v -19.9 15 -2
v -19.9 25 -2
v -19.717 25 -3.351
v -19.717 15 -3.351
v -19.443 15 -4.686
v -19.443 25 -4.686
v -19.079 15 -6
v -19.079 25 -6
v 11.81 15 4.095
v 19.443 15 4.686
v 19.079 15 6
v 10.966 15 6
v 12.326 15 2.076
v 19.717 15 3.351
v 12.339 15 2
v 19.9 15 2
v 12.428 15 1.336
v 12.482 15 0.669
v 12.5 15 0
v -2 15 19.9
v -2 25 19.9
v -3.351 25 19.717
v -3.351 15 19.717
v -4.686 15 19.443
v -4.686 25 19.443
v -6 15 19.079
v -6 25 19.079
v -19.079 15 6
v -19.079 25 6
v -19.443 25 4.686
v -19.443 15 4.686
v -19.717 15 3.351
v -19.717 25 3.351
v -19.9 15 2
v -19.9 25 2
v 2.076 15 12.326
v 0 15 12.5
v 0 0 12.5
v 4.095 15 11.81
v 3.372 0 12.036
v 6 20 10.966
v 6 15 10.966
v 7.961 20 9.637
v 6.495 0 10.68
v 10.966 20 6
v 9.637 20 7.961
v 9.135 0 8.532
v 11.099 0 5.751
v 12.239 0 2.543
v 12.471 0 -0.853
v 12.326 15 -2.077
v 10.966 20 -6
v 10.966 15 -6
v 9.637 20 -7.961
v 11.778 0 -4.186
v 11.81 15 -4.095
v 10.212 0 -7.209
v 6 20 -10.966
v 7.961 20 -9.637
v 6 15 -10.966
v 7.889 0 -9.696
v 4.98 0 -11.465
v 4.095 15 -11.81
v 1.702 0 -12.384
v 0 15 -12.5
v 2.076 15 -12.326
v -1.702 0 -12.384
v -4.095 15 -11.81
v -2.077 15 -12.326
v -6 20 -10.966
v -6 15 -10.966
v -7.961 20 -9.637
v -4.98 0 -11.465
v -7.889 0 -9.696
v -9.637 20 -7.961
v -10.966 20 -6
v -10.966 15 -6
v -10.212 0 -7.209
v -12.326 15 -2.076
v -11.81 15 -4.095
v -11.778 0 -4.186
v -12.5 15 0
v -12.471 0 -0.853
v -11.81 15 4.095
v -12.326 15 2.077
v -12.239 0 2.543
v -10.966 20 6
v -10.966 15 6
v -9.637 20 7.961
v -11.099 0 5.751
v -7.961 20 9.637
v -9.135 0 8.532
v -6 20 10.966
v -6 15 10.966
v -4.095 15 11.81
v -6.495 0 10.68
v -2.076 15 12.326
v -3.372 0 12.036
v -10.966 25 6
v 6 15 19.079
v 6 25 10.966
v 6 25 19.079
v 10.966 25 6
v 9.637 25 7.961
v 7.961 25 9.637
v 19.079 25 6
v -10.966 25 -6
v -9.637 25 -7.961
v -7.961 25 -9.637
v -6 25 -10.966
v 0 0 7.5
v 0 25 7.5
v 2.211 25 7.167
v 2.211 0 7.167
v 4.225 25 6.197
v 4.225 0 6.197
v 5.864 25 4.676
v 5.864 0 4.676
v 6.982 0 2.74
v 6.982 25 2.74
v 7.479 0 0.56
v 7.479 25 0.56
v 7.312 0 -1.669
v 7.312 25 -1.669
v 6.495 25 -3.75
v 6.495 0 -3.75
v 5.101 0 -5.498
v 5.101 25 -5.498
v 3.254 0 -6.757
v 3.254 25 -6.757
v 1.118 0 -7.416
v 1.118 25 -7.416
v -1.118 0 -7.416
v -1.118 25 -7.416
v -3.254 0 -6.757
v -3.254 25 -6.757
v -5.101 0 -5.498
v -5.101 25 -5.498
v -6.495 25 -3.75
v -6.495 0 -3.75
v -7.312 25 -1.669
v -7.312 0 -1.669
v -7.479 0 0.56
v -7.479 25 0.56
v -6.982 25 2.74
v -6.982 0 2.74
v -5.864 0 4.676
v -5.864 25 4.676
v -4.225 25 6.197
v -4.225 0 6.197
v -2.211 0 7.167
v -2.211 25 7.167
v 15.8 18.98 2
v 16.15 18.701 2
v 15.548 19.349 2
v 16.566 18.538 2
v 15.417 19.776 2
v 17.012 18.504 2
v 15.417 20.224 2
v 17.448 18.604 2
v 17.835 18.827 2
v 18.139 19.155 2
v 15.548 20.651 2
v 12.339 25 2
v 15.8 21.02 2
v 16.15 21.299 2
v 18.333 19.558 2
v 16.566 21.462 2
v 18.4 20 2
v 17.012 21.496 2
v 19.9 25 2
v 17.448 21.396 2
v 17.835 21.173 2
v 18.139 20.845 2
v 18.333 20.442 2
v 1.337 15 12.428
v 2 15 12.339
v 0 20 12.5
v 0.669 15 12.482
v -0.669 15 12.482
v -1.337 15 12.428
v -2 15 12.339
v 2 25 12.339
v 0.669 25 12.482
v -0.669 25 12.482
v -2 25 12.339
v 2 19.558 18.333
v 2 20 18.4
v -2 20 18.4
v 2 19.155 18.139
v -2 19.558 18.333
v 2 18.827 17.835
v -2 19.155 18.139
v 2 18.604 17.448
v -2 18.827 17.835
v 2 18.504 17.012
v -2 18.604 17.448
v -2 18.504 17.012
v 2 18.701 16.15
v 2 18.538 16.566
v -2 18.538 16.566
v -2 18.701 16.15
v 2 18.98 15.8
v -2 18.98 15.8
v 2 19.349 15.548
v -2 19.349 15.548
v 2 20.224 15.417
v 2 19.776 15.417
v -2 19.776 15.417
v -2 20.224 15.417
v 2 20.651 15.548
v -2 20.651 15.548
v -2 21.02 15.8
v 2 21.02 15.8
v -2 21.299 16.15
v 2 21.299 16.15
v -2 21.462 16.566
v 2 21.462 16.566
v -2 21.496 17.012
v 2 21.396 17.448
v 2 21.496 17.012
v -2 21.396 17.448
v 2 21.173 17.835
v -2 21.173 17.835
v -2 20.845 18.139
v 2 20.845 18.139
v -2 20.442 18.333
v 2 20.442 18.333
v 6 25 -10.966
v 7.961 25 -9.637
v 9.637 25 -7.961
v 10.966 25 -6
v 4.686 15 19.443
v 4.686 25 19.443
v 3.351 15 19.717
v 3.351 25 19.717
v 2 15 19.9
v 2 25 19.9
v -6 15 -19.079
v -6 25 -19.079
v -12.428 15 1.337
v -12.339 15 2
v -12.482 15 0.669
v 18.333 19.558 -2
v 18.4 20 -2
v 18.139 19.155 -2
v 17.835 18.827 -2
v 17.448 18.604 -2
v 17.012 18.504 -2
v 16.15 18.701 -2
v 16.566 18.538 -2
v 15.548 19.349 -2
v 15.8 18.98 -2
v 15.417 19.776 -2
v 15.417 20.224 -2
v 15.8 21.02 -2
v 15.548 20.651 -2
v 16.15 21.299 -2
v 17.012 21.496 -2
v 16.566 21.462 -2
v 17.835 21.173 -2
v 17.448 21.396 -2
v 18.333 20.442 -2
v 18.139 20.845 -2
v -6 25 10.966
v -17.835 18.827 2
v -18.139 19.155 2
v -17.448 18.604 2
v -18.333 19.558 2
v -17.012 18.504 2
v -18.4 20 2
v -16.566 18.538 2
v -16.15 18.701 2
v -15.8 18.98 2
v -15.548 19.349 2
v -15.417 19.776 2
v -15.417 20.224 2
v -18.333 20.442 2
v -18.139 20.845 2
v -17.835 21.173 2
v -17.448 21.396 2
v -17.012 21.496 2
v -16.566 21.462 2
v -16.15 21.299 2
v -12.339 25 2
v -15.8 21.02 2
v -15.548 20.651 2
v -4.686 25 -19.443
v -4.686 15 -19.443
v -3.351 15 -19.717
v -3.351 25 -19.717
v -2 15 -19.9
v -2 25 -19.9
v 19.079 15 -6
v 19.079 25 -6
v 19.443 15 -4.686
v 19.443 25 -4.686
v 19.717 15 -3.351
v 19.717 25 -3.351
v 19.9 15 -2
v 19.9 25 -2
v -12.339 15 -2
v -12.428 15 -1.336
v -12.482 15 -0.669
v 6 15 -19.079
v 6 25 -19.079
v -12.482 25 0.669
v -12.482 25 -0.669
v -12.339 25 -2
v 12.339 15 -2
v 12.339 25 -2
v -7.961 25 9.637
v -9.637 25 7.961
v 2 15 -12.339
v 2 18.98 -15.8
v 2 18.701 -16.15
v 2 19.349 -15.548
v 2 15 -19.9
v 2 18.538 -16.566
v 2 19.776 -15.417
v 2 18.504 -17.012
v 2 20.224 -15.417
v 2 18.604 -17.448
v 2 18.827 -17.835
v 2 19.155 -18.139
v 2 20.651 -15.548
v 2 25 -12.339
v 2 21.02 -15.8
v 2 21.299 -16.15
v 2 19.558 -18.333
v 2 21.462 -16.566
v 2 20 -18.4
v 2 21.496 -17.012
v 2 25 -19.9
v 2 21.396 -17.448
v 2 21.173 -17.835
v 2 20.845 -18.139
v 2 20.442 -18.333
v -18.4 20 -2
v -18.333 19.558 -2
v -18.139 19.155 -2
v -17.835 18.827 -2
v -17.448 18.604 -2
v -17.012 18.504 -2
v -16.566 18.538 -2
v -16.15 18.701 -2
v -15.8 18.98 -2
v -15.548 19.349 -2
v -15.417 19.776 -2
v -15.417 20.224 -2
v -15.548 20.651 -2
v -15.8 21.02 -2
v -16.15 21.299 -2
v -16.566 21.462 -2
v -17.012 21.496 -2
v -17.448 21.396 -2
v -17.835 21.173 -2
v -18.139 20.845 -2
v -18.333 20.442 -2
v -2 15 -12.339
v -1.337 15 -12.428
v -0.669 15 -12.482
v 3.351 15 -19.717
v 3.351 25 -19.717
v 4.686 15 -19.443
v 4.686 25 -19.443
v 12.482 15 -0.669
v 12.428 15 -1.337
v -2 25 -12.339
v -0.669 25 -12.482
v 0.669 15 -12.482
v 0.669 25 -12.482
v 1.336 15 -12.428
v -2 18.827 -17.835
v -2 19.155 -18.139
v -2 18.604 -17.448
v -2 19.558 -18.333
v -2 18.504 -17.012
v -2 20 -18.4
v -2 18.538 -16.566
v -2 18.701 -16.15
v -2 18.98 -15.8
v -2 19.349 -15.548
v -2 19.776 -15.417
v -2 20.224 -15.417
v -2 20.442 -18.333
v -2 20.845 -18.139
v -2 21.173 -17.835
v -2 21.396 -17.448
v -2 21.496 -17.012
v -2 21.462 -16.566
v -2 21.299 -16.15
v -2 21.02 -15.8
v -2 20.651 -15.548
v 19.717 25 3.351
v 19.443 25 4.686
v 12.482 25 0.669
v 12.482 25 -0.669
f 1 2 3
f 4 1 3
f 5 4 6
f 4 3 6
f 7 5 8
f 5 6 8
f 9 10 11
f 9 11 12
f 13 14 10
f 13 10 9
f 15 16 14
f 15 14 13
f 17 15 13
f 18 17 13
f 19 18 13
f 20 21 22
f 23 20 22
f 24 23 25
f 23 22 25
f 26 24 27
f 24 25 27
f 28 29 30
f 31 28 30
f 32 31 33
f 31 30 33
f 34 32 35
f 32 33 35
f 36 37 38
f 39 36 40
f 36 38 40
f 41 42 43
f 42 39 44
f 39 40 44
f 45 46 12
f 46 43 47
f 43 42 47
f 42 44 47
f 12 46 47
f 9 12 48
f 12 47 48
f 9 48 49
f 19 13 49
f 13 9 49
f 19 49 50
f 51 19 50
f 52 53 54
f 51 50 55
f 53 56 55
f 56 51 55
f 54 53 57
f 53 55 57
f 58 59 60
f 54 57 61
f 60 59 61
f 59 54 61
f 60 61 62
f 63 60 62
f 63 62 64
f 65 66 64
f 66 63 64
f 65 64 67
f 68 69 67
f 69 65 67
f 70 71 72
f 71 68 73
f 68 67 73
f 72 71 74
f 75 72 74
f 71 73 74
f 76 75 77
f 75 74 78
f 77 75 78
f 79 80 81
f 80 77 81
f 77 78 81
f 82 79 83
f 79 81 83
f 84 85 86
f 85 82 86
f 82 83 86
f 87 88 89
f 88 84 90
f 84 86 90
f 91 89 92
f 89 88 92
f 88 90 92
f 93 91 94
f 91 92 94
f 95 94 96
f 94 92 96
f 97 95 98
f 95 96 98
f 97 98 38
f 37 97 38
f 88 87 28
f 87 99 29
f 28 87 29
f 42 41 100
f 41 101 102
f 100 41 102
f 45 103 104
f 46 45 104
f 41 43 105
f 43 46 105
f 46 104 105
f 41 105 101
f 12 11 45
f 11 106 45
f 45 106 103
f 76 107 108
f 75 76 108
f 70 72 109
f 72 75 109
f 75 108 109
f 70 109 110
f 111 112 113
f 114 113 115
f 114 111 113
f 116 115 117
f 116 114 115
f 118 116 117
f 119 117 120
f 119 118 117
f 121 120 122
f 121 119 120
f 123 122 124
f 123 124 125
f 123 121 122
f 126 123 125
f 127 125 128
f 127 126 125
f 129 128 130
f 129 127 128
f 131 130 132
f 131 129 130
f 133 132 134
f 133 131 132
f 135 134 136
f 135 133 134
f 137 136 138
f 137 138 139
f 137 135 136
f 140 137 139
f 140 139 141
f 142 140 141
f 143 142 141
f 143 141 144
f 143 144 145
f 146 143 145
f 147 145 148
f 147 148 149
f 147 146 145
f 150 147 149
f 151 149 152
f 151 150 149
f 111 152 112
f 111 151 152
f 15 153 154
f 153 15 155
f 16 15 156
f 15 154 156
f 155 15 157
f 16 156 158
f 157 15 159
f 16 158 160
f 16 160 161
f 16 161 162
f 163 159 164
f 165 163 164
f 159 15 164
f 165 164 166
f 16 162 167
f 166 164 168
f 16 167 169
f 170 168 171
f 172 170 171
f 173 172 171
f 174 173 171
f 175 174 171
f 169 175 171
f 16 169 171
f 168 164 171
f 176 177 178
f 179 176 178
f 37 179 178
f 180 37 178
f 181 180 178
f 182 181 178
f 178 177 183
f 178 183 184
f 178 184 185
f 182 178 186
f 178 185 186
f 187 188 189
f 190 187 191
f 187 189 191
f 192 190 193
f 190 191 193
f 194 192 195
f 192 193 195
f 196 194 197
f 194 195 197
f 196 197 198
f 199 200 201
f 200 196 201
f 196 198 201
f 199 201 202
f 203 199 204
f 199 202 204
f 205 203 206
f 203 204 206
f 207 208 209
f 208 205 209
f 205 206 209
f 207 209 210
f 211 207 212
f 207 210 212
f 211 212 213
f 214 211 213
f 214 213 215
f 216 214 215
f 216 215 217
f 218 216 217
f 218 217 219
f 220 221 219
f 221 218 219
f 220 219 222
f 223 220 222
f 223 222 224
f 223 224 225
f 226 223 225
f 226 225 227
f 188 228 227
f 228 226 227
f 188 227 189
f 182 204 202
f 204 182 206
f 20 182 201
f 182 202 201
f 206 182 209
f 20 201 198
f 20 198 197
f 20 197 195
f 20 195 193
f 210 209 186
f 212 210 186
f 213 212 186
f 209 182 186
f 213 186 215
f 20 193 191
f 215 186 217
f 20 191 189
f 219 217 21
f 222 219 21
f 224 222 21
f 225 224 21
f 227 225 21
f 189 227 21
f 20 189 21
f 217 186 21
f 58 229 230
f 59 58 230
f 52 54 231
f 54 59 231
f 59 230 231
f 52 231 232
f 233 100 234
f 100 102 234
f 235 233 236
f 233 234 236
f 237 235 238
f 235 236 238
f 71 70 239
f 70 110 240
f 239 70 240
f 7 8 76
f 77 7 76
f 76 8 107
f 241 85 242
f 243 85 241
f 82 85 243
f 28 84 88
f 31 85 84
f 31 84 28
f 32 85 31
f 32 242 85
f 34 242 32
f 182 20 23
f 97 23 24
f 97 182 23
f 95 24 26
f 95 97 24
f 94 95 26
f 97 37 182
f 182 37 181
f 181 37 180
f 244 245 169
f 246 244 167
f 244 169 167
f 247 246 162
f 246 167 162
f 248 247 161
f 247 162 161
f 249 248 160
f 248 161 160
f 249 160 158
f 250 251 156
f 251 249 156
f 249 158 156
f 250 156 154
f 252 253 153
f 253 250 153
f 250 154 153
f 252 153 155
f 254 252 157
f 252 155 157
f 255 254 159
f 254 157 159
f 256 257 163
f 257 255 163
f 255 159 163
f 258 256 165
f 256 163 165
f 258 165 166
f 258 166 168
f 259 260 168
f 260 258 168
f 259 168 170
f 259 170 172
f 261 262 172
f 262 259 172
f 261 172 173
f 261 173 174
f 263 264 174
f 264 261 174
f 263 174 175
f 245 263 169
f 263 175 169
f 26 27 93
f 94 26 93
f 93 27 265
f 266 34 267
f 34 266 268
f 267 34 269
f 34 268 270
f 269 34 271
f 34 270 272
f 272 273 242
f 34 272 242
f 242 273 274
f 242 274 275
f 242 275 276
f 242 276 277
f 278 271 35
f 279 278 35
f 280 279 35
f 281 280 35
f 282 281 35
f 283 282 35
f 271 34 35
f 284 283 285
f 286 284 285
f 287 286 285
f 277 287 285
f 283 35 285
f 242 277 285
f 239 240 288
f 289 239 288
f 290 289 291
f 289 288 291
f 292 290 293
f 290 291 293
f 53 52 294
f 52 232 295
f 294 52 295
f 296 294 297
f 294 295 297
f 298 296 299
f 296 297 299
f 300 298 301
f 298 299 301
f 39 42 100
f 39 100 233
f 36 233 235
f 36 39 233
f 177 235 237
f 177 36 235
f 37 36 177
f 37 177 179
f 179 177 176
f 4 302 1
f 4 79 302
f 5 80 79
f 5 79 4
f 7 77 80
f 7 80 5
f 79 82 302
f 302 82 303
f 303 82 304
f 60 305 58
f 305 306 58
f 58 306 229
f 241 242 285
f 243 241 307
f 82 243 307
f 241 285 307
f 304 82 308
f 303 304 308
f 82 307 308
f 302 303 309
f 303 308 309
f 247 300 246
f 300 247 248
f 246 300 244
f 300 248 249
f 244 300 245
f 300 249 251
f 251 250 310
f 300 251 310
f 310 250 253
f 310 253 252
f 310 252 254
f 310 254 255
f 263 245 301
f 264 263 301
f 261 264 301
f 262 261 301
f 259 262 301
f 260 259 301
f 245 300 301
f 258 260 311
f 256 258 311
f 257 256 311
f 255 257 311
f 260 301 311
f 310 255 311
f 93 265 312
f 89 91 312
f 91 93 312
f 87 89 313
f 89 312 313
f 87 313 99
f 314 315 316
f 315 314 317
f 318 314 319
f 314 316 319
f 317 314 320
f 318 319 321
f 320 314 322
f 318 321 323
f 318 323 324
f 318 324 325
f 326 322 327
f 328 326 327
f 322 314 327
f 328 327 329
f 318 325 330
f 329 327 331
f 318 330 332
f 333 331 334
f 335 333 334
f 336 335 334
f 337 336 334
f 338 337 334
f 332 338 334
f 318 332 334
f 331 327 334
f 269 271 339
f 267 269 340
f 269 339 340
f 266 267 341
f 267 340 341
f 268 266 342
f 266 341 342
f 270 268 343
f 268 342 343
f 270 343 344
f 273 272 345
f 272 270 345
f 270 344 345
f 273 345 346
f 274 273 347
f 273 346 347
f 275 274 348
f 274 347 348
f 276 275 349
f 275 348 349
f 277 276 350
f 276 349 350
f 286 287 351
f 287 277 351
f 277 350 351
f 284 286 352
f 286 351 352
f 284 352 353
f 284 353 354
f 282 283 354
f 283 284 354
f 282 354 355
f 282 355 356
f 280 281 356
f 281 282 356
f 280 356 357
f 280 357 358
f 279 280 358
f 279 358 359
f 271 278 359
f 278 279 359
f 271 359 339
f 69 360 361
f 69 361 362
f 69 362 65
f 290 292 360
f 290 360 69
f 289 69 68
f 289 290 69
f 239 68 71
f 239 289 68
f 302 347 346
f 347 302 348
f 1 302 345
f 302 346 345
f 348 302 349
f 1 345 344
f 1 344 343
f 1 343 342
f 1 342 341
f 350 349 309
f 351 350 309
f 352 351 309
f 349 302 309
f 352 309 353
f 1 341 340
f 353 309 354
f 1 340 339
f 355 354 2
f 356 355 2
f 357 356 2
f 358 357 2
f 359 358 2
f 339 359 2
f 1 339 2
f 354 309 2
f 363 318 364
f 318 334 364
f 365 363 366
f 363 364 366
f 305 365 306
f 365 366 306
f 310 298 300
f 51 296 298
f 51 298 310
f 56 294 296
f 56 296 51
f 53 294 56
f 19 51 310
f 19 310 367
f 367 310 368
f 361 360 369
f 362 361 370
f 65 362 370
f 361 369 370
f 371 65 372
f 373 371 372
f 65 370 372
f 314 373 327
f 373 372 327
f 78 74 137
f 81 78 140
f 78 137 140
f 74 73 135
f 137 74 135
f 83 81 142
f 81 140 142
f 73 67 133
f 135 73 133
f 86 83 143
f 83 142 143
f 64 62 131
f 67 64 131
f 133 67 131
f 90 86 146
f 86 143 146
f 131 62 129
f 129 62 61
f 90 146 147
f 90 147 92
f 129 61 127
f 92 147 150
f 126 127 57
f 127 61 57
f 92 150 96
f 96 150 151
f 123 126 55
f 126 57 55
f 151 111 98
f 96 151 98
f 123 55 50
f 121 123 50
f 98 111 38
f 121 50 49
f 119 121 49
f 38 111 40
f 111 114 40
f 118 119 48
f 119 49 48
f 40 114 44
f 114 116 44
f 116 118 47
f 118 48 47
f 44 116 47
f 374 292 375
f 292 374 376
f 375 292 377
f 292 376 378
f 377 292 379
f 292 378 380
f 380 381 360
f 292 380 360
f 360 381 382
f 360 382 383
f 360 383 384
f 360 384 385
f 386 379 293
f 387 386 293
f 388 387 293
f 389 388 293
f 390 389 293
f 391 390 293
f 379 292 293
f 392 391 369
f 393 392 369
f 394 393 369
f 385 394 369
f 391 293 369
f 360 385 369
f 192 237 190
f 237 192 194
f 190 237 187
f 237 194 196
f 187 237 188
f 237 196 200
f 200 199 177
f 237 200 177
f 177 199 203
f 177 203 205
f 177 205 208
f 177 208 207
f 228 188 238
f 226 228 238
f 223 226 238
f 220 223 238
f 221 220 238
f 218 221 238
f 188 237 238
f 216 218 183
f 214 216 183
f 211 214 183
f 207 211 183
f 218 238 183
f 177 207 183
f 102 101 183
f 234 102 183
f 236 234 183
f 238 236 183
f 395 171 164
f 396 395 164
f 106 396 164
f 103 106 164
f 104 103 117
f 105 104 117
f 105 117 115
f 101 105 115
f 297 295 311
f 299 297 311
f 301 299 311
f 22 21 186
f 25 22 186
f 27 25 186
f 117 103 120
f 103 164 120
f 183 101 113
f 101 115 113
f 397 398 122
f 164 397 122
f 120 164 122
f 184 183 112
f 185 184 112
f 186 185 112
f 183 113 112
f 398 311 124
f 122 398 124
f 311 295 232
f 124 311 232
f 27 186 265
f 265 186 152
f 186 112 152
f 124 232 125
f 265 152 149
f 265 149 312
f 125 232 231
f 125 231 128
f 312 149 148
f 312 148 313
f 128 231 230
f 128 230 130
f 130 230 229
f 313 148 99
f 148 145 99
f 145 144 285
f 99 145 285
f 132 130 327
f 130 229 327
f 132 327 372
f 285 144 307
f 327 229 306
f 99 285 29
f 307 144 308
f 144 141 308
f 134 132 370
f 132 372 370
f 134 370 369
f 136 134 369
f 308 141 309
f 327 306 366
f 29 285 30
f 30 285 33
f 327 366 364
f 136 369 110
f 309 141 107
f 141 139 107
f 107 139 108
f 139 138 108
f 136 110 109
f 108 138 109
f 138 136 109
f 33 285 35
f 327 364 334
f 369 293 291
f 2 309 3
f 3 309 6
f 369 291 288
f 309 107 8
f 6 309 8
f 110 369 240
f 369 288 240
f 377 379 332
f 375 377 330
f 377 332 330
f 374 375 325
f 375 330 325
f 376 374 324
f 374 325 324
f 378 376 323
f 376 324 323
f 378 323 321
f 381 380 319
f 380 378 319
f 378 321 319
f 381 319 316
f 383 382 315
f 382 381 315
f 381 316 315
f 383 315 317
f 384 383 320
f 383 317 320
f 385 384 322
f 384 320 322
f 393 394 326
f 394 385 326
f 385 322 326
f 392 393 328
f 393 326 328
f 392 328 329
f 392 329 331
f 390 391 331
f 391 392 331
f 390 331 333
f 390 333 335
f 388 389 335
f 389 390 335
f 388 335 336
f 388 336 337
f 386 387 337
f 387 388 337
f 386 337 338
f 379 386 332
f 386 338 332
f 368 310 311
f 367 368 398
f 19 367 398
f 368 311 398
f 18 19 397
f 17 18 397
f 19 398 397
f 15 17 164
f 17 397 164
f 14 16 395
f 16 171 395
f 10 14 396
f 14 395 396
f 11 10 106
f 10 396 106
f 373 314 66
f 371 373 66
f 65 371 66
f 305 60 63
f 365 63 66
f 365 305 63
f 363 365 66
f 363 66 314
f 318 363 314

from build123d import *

# Parameters (mm, degrees)
SKETCH1_R           = 12.5
SKETCH1_R_2         = 7.5
BOSS_EXTRUDE1_DEPTH = 20
SKETCH2_R           = 7.5
BOSS_EXTRUDE2_DEPTH = 5
SKETCH3_R           = 1.5
BOSS_EXTRUDE3_DEPTH = 7
CIRPATTERN1_COUNT   = 4


with BuildPart() as part:
    # Sketch1 → Boss-Extrude1 (new body)
    with BuildSketch(Plane(origin=(0, 0, 0), x_dir=(1, 0, 0), z_dir=(0, 1, 0))):
        with Locations(Location((0, 0, 0), (0, 0, 270))):
            Circle(SKETCH1_R)
        with Locations(Location((0, 0, 0), (0, 0, 270))):
            Circle(SKETCH1_R_2, mode=Mode.SUBTRACT)
    extrude(amount=BOSS_EXTRUDE1_DEPTH)

    # Sketch2 → Boss-Extrude2 (add, symmetric)
    with BuildSketch(Plane(origin=(0, 20, 0), x_dir=(1, 0, 0), z_dir=(0, 1, 0))):
        with BuildLine():
            Line((-2, 19.899749), (-2, 12.338963))
            ThreePointArc((-2, 12.338963), (0, 12.5), (2, 12.338963))
            Line((2, 12.338963), (2, 19.899749))
            ThreePointArc((2, 19.899749), (4.021007, 19.591618), (6, 19.078784))
            Line((6, 19.078784), (6, 10.965856))
            ThreePointArc((6, 10.965856), (8.838835, 8.838835), (10.965856, 6))
            Line((10.965856, 6), (19.078784, 6))
            ThreePointArc((19.078784, 6), (19.591618, 4.021007), (19.899749, 2))
            Line((19.899749, 2), (12.338963, 2))
            ThreePointArc((12.338963, 2), (12.5, 0), (12.338963, -2))
            Line((12.338963, -2), (19.899749, -2))
            ThreePointArc((19.899749, -2), (19.591618, -4.021007), (19.078784, -6))
            Line((19.078784, -6), (10.965856, -6))
            ThreePointArc((10.965856, -6), (8.838835, -8.838835), (6, -10.965856))
            Line((6, -10.965856), (6, -19.078784))
            ThreePointArc((6, -19.078784), (4.021007, -19.591618), (2, -19.899749))
            Line((2, -19.899749), (2, -12.338963))
            ThreePointArc((2, -12.338963), (0, -12.5), (-2, -12.338963))
            Line((-2, -12.338963), (-2, -19.899749))
            ThreePointArc((-2, -19.899749), (-4.021007, -19.591618), (-6, -19.078784))
            Line((-6, -19.078784), (-6, -10.965856))
            ThreePointArc((-6, -10.965856), (-8.838835, -8.838835), (-10.965856, -6))
            Line((-10.965856, -6), (-19.078784, -6))
            ThreePointArc((-19.078784, -6), (-19.591618, -4.021007), (-19.899749, -2))
            Line((-19.899749, -2), (-12.338963, -2))
            ThreePointArc((-12.338963, -2), (-12.5, 0), (-12.338963, 2))
            Line((-12.338963, 2), (-19.899749, 2))
            ThreePointArc((-19.899749, 2), (-19.591618, 4.021007), (-19.078784, 6))
            Line((-19.078784, 6), (-10.965856, 6))
            ThreePointArc((-10.965856, 6), (-8.838835, 8.838835), (-6, 10.965856))
            Line((-6, 10.965856), (-6, 19.078784))
            ThreePointArc((-6, 19.078784), (-4.021007, 19.591618), (-2, 19.899749))
        make_face()
        with Locations(Location((0, 0, 0), (0, 0, 270))):
            Circle(SKETCH2_R, mode=Mode.SUBTRACT)
    extrude(amount=BOSS_EXTRUDE2_DEPTH, both=True)

    # Sketch3 → Boss-Extrude3 (add)
    with BuildSketch(Plane.XY.offset(-2)):
        with Locations(Location((-16.899749, 20, 0), (0, 0, 180))):
            Circle(SKETCH3_R)
    boss_extrude3 = extrude(amount=BOSS_EXTRUDE3_DEPTH)

    # CirPattern1: Boss-Extrude3 ×4 about axis
    cirpattern1_axis = Axis((0, 0, 0), (0, -1, 0))
    for i in range(1, CIRPATTERN1_COUNT):
        add(boss_extrude3.rotate(cirpattern1_axis, i * 360 / CIRPATTERN1_COUNT))


solid = part.part
